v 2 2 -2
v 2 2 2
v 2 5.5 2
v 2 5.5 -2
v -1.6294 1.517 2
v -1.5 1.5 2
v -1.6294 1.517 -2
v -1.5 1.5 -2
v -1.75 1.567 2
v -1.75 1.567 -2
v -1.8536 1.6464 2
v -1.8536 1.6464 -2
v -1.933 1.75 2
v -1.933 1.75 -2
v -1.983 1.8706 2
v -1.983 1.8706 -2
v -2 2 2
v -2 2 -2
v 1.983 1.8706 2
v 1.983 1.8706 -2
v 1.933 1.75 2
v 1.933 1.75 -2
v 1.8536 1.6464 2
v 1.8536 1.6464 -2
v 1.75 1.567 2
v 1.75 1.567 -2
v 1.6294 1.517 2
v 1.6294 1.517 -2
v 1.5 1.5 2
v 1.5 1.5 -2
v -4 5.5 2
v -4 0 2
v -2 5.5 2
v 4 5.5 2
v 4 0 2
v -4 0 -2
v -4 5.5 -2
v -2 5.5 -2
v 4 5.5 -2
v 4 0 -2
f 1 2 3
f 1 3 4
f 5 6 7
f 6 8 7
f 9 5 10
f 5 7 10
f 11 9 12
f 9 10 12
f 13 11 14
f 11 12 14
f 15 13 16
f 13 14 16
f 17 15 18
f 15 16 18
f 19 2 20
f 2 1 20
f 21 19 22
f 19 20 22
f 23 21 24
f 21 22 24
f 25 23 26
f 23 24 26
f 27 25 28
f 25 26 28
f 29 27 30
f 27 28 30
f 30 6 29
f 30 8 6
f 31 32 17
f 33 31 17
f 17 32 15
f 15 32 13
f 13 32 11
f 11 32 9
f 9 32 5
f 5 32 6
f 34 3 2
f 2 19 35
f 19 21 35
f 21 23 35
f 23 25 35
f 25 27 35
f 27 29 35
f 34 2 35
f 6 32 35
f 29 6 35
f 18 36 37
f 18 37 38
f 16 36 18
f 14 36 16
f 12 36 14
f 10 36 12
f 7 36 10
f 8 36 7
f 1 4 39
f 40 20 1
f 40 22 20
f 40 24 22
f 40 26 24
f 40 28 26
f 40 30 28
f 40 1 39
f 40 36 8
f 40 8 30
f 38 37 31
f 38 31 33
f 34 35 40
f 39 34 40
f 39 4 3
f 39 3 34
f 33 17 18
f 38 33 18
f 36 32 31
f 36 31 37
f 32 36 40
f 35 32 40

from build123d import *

# Parameters (mm, degrees)
SKETCH_1_W        = 2
SKETCH_1_H        = 4
EXTRUDE_1_DEPTH   = 5.5
EXTRUDE_1_2_DEPTH = 5.5
SKETCH_1_3_W      = 4
SKETCH_1_3_H      = 4
EXTRUDE_2_DEPTH   = 1.5
FILLET_1_R        = 0.5


with BuildPart() as part:
    # 草图1 → 凸台-拉伸1 (new body)
    with BuildSketch(Plane(origin=(0, 0, 0), x_dir=(1, 0, 0), z_dir=(0, 1, 0))):
        with Locations((-3, 0)):
            Rectangle(SKETCH_1_W, SKETCH_1_H)
    extrude(amount=EXTRUDE_1_DEPTH)



with BuildPart() as body_2:
    # 草图1 → Extrude 1 2 (new body)
    with BuildSketch(Plane(origin=(0, 0, 0), x_dir=(1, 0, 0), z_dir=(0, 1, 0))):
        with Locations((3, 0)):
            Rectangle(SKETCH_1_W, SKETCH_1_H)
    extrude(amount=EXTRUDE_1_2_DEPTH)


with BuildPart() as part_1:
    add(part.part)

    add(body_2.part)  # 凸台-拉伸2 merges body 2
    # 草图1<3> → 凸台-拉伸2 (add)
    with BuildSketch(Plane(origin=(0, 0, 0), x_dir=(1, 0, 0), z_dir=(0, 1, 0))):
        Rectangle(SKETCH_1_3_W, SKETCH_1_3_H)
    extrude(amount=EXTRUDE_2_DEPTH)

    # 圆角1
    fillet_1_edges = [part_1.edges().sort_by_distance(p)[0] for p in [
        (2, 1.5, 0),
        (-2, 1.5, 0),
    ]]
    fillet(fillet_1_edges, radius=FILLET_1_R)


solid = part_1.part
